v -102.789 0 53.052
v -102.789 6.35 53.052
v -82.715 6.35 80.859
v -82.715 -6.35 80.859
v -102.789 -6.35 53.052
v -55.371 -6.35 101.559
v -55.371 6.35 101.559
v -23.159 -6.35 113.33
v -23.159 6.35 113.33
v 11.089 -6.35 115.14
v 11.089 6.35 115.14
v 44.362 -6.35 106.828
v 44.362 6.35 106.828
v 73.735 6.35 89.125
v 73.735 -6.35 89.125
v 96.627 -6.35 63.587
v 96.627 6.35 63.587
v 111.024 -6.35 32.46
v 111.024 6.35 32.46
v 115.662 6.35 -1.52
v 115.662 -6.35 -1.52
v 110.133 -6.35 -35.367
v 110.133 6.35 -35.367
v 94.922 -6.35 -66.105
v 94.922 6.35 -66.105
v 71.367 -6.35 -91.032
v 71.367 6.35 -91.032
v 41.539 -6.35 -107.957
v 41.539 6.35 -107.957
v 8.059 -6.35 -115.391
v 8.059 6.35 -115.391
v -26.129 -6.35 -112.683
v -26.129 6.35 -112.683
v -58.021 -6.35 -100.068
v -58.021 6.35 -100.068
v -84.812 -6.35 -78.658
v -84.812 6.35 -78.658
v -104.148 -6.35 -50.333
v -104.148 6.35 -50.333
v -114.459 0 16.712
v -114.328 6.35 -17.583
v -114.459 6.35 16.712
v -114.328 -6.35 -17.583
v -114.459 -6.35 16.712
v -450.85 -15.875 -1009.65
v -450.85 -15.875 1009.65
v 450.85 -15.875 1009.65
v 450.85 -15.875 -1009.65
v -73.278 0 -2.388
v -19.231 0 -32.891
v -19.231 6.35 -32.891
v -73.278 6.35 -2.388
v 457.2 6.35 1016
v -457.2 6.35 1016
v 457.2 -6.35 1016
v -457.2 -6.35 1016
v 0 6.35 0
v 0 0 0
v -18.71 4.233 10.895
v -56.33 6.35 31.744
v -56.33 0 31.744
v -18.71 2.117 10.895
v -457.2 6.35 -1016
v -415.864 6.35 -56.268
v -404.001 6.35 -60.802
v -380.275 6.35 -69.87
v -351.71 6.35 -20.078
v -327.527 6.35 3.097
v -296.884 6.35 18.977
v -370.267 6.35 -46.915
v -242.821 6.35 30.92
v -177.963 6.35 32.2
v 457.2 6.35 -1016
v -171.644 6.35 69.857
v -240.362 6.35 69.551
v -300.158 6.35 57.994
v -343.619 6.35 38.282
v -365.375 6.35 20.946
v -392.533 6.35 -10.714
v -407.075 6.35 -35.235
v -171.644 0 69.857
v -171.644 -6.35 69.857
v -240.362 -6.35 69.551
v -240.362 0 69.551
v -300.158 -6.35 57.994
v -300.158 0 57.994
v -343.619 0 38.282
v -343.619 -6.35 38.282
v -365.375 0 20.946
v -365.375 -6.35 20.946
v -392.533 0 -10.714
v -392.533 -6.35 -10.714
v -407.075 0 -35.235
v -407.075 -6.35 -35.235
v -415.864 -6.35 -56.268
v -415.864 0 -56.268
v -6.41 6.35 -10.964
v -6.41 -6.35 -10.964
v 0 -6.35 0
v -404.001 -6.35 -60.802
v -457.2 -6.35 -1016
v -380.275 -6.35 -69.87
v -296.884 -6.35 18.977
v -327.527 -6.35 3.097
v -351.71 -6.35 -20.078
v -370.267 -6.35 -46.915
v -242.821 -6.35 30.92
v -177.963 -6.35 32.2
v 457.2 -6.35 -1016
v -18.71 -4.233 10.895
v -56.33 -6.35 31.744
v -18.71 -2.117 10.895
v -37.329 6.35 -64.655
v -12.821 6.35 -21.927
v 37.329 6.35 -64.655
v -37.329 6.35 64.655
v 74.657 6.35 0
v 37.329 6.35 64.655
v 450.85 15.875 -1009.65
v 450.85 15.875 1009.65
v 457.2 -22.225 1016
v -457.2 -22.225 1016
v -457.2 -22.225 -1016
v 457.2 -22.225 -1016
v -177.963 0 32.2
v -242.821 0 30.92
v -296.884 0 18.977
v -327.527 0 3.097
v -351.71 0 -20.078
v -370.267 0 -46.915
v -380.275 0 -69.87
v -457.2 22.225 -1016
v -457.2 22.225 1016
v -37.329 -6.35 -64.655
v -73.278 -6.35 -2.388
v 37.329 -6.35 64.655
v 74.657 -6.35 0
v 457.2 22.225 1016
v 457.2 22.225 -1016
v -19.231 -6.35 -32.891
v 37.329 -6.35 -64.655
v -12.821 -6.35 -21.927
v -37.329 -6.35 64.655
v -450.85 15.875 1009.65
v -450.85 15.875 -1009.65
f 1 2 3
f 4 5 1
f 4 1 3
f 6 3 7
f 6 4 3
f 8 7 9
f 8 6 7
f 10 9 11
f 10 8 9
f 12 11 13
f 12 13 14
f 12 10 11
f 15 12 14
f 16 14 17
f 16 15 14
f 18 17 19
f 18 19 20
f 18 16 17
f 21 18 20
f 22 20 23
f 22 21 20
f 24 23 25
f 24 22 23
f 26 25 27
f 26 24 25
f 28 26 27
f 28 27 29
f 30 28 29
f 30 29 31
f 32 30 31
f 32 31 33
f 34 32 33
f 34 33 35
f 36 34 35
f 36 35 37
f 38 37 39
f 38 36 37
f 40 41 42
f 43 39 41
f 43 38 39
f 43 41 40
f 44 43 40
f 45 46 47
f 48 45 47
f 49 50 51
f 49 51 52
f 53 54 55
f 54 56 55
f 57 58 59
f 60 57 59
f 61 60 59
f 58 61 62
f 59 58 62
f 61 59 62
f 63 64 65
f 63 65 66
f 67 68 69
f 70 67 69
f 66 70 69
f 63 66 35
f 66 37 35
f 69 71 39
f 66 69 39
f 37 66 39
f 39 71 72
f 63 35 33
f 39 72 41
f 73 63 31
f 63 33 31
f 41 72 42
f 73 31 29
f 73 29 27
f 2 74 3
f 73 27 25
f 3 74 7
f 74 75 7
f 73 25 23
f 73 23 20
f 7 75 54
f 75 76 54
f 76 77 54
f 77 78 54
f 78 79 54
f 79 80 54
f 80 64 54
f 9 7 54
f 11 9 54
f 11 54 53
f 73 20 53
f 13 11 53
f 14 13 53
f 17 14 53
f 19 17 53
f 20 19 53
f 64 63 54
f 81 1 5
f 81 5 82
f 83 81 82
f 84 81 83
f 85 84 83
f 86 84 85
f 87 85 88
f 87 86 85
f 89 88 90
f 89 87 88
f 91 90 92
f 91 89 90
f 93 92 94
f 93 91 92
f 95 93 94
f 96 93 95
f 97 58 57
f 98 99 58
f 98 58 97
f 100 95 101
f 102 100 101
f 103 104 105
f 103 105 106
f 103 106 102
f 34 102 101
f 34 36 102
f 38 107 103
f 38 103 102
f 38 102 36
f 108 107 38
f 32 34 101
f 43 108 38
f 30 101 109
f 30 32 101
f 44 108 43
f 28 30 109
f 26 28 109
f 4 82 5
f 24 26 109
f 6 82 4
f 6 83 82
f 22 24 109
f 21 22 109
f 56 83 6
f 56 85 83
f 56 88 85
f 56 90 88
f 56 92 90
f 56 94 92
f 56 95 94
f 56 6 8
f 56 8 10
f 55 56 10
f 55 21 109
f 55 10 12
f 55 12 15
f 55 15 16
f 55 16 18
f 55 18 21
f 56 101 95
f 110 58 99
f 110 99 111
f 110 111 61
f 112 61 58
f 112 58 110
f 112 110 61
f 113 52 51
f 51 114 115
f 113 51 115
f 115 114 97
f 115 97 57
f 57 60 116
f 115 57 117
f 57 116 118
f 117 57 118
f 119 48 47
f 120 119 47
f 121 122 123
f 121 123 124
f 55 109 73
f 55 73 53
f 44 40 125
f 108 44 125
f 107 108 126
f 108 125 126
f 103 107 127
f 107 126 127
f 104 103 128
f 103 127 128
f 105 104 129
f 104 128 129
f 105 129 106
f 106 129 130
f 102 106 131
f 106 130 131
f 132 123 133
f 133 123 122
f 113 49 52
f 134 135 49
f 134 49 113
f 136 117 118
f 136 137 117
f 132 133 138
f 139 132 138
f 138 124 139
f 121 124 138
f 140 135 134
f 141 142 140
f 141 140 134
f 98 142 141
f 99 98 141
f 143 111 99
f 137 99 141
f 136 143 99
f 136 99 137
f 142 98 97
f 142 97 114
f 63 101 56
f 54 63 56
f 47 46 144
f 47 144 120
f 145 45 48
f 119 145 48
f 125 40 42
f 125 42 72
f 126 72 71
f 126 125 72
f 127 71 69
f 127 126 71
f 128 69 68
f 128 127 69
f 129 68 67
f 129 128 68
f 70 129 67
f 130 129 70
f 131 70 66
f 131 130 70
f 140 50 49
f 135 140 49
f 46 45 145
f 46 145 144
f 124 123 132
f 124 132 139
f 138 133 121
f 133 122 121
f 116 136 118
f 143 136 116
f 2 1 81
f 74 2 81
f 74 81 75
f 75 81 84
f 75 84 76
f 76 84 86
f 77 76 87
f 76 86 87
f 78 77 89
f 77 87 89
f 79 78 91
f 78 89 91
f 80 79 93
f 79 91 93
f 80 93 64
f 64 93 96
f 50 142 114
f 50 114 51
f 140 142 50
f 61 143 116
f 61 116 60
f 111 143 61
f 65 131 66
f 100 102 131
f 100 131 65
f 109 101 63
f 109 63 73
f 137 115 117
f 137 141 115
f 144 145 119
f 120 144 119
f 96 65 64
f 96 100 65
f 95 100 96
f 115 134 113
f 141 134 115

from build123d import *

# Parameters (mm, degrees)
F0_W     = 914.4
F0_H     = 2032
F1_DEPTH = 22.225
F2_T     = -6.35
F3_W     = 914.4
F3_H     = 2032
F4_DEPTH = 6.35


# Not quite as in the source:
# - the dataset's text gives a spline's control points without its knots; the knots are read off the source's solid
# - a feature names something its author has since deleted; it is built from what else it names


with BuildPart() as f1:
    # F0 (on Front) → F1 (new body, symmetric)
    with BuildSketch(Plane.XZ):
        Rectangle(F0_W, F0_H)
    extrude(amount=F1_DEPTH, both=True)

    # F2 (hollow: no face is removed)
    offset(amount=F2_T, mode=Mode.SUBTRACT)


with BuildPart() as f4:
    # F3 (on Front) → F4 (new body, symmetric)
    with BuildSketch(Plane.XZ):
        Rectangle(F3_W, F3_H)
        with BuildLine():
            add(Edge.make_bspline(
                [(-102.788878744, 53.0522555544), (-115.0796561664, 57.7747130109), (-172.109902554, 75.8931860417), (-272.4486443535, 70.1170066616), (-353.7320815536, 40.4856256956), (-402.3453308508, -20.8974867371), (-411.9104648371, -45.9242845247), (-415.8637821674, -56.2679842114)],
                knots=[0.1925412434, 0.1925412434, 0.1925412434, 0.1925412434, 0.2598556278, 0.5007810461, 0.6941216382, 0.8735789556, 1, 1, 1, 1], degree=3))
            ThreePointArc((-102.788878744, 53.0522555544), (27.297096775, 112.4053553907), (115.6723623553, 0))
            ThreePointArc((115.6723623553, 0), (-8.3781922539, -115.368545572), (-114.4586911894, 16.7123733823))
            add(Edge.make_bspline(
                [(-114.4586911894, 16.7123733823), (-119.373915653, 18.6409773824), (-126.780010707, 21.3246804139), (-135.3769480544, 24.0011548026), (-140.3568205391, 25.4145011425), (-144.0830186716, 26.4018437315), (-147.1822873269, 27.1632650826), (-149.6569220432, 27.7345753336), (-153.3861427683, 28.5587482576), (-159.0370105211, 29.6716080851), (-166.6748632527, 30.8983238142), (-174.3948906026, 31.8744426293), (-182.175713824, 32.607269398), (-192.6017748616, 33.2707129632), (-205.6752257784, 33.5333589987), (-221.2462439818, 33.019172763), (-233.9701770212, 31.9719071287), (-243.904748781, 30.8102997522), (-251.2096448082, 29.7898690479), (-257.1560475615, 28.8258650751), (-261.8154455178, 27.9934473686), (-265.2608722389, 27.33969481), (-268.6427806681, 26.6605890428), (-273.039065215, 25.726133421), (-278.3374380434, 24.4991846311), (-284.3834831204, 22.9279699464), (-292.0432019853, 20.6943122087), (-300.8925913227, 17.6307385606), (-308.8851535917, 14.1698326237), (-314.8583988735, 11.1266815586), (-319.1554720592, 8.6930736846), (-323.298239195, 6.0910038781), (-326.3105701104, 3.9977373945), (-328.2890021767, 2.5346327242), (-329.5984230491, 1.5422377588), (-331.2419023871, 0.2509479554), (-333.2206947963, -1.3764025092), (-335.8596426843, -3.6424838525), (-339.1459948656, -6.6423529507), (-343.0294781647, -10.4641063031), (-346.8163532922, -14.459813445), (-350.4730691017, -18.5798240363), (-353.9684413043, -22.7729503539), (-357.273045034, -26.9863828828), (-360.3585883118, -31.1651712353), (-363.1976042652, -35.2518241058), (-365.3345588114, -38.5282614985), (-366.8937992739, -41.039502175), (-367.9816193163, -42.8537563567), (-368.9967401066, -44.6097462535), (-370.267963964, -46.89150151), (-371.7173740536, -49.6457172315), (-373.2876715658, -52.858174126), (-375.2232016159, -57.1070610359), (-377.4658419186, -62.5281453327), (-379.2973206299, -67.3131809286), (-380.2745405787, -69.8700385835)],
                knots=[0.1884362819, 0.1884362819, 0.1884362819, 0.1884362819, 0.21875, 0.234375, 0.2421875, 0.25, 0.2578125, 0.26171875, 0.265625, 0.28125, 0.296875, 0.3125, 0.328125, 0.34375, 0.375, 0.40625, 0.4375, 0.453125, 0.46875, 0.484375, 0.4921875, 0.5, 0.5078125, 0.515625, 0.53125, 0.546875, 0.5625, 0.59375, 0.625, 0.640625, 0.65625, 0.671875, 0.6875, 0.69140625, 0.6953125, 0.703125, 0.7109375, 0.71875, 0.734375, 0.75, 0.765625, 0.78125, 0.796875, 0.8125, 0.828125, 0.84375, 0.859375, 0.8671875, 0.875, 0.8828125, 0.890625, 0.90625, 0.921875, 0.9375, 0.96875, 1, 1, 1, 1], degree=3))
            Line((-380.2745405787, -69.8700385835), (-392.1376211083, -65.3360204595))
            Line((-392.1376211083, -65.3360204595), (-404.0007016379, -60.8020023355))
            Line((-404.0007016379, -60.8020023355), (-415.8637821674, -56.2679842114))
        make_face(mode=Mode.SUBTRACT)
    extrude(amount=F4_DEPTH, both=True)


with BuildPart() as f4b:
    # F3 (on Front) → F4, piece 2 (new body, symmetric)
    with BuildSketch(Plane.XZ):
        with BuildLine():
            Line((37.3285076505, 64.6548718214), (-37.3285076505, 64.6548718214))
            Line((-37.3285076505, 64.6548718214), (-56.3298401221, 31.7435985691))
            add(Edge.make_bspline(
                [(0, 0), (-18.7011235658, 10.9343625548), (-37.4022471317, 21.8687251095), (-56.3298401221, 31.7435985691)],
                knots=[0, 0, 0, 0, 0.1064783731, 0.1064783731, 0.1064783731, 0.1064783731], degree=3))
            Line((0, 0), (-6.4102574675, -10.9635121745))
            Line((-6.4102574675, -10.9635121745), (-12.8205149351, -21.9270243489))
            Line((-12.8205149351, -21.9270243489), (-19.2307724026, -32.8905365234))
            add(Edge.make_bspline(
                [(-19.2307724026, -32.8905365234), (-30.2078392868, -26.4723537507), (-46.4073877333, -17.00410068), (-64.2129954804, -7.1787118869), (-71.3710947537, -3.3861690523), (-73.2781581831, -2.3882505846)],
                knots=[0, 0, 0, 0, 0.0625, 0.09375, 0.1051349345, 0.1051349345, 0.1051349345, 0.1051349345], degree=3))
            Line((-73.2781581831, -2.3882505846), (-37.3285076505, -64.6548718214))
            Line((-37.3285076505, -64.6548718214), (37.3285076505, -64.6548718214))
            Line((37.3285076505, -64.6548718214), (74.657015301, 0))
            Line((74.657015301, 0), (37.3285076505, 64.6548718214))
        make_face()
    extrude(amount=F4_DEPTH, both=True)


solid = Compound([f1.part, f4.part, f4b.part])
